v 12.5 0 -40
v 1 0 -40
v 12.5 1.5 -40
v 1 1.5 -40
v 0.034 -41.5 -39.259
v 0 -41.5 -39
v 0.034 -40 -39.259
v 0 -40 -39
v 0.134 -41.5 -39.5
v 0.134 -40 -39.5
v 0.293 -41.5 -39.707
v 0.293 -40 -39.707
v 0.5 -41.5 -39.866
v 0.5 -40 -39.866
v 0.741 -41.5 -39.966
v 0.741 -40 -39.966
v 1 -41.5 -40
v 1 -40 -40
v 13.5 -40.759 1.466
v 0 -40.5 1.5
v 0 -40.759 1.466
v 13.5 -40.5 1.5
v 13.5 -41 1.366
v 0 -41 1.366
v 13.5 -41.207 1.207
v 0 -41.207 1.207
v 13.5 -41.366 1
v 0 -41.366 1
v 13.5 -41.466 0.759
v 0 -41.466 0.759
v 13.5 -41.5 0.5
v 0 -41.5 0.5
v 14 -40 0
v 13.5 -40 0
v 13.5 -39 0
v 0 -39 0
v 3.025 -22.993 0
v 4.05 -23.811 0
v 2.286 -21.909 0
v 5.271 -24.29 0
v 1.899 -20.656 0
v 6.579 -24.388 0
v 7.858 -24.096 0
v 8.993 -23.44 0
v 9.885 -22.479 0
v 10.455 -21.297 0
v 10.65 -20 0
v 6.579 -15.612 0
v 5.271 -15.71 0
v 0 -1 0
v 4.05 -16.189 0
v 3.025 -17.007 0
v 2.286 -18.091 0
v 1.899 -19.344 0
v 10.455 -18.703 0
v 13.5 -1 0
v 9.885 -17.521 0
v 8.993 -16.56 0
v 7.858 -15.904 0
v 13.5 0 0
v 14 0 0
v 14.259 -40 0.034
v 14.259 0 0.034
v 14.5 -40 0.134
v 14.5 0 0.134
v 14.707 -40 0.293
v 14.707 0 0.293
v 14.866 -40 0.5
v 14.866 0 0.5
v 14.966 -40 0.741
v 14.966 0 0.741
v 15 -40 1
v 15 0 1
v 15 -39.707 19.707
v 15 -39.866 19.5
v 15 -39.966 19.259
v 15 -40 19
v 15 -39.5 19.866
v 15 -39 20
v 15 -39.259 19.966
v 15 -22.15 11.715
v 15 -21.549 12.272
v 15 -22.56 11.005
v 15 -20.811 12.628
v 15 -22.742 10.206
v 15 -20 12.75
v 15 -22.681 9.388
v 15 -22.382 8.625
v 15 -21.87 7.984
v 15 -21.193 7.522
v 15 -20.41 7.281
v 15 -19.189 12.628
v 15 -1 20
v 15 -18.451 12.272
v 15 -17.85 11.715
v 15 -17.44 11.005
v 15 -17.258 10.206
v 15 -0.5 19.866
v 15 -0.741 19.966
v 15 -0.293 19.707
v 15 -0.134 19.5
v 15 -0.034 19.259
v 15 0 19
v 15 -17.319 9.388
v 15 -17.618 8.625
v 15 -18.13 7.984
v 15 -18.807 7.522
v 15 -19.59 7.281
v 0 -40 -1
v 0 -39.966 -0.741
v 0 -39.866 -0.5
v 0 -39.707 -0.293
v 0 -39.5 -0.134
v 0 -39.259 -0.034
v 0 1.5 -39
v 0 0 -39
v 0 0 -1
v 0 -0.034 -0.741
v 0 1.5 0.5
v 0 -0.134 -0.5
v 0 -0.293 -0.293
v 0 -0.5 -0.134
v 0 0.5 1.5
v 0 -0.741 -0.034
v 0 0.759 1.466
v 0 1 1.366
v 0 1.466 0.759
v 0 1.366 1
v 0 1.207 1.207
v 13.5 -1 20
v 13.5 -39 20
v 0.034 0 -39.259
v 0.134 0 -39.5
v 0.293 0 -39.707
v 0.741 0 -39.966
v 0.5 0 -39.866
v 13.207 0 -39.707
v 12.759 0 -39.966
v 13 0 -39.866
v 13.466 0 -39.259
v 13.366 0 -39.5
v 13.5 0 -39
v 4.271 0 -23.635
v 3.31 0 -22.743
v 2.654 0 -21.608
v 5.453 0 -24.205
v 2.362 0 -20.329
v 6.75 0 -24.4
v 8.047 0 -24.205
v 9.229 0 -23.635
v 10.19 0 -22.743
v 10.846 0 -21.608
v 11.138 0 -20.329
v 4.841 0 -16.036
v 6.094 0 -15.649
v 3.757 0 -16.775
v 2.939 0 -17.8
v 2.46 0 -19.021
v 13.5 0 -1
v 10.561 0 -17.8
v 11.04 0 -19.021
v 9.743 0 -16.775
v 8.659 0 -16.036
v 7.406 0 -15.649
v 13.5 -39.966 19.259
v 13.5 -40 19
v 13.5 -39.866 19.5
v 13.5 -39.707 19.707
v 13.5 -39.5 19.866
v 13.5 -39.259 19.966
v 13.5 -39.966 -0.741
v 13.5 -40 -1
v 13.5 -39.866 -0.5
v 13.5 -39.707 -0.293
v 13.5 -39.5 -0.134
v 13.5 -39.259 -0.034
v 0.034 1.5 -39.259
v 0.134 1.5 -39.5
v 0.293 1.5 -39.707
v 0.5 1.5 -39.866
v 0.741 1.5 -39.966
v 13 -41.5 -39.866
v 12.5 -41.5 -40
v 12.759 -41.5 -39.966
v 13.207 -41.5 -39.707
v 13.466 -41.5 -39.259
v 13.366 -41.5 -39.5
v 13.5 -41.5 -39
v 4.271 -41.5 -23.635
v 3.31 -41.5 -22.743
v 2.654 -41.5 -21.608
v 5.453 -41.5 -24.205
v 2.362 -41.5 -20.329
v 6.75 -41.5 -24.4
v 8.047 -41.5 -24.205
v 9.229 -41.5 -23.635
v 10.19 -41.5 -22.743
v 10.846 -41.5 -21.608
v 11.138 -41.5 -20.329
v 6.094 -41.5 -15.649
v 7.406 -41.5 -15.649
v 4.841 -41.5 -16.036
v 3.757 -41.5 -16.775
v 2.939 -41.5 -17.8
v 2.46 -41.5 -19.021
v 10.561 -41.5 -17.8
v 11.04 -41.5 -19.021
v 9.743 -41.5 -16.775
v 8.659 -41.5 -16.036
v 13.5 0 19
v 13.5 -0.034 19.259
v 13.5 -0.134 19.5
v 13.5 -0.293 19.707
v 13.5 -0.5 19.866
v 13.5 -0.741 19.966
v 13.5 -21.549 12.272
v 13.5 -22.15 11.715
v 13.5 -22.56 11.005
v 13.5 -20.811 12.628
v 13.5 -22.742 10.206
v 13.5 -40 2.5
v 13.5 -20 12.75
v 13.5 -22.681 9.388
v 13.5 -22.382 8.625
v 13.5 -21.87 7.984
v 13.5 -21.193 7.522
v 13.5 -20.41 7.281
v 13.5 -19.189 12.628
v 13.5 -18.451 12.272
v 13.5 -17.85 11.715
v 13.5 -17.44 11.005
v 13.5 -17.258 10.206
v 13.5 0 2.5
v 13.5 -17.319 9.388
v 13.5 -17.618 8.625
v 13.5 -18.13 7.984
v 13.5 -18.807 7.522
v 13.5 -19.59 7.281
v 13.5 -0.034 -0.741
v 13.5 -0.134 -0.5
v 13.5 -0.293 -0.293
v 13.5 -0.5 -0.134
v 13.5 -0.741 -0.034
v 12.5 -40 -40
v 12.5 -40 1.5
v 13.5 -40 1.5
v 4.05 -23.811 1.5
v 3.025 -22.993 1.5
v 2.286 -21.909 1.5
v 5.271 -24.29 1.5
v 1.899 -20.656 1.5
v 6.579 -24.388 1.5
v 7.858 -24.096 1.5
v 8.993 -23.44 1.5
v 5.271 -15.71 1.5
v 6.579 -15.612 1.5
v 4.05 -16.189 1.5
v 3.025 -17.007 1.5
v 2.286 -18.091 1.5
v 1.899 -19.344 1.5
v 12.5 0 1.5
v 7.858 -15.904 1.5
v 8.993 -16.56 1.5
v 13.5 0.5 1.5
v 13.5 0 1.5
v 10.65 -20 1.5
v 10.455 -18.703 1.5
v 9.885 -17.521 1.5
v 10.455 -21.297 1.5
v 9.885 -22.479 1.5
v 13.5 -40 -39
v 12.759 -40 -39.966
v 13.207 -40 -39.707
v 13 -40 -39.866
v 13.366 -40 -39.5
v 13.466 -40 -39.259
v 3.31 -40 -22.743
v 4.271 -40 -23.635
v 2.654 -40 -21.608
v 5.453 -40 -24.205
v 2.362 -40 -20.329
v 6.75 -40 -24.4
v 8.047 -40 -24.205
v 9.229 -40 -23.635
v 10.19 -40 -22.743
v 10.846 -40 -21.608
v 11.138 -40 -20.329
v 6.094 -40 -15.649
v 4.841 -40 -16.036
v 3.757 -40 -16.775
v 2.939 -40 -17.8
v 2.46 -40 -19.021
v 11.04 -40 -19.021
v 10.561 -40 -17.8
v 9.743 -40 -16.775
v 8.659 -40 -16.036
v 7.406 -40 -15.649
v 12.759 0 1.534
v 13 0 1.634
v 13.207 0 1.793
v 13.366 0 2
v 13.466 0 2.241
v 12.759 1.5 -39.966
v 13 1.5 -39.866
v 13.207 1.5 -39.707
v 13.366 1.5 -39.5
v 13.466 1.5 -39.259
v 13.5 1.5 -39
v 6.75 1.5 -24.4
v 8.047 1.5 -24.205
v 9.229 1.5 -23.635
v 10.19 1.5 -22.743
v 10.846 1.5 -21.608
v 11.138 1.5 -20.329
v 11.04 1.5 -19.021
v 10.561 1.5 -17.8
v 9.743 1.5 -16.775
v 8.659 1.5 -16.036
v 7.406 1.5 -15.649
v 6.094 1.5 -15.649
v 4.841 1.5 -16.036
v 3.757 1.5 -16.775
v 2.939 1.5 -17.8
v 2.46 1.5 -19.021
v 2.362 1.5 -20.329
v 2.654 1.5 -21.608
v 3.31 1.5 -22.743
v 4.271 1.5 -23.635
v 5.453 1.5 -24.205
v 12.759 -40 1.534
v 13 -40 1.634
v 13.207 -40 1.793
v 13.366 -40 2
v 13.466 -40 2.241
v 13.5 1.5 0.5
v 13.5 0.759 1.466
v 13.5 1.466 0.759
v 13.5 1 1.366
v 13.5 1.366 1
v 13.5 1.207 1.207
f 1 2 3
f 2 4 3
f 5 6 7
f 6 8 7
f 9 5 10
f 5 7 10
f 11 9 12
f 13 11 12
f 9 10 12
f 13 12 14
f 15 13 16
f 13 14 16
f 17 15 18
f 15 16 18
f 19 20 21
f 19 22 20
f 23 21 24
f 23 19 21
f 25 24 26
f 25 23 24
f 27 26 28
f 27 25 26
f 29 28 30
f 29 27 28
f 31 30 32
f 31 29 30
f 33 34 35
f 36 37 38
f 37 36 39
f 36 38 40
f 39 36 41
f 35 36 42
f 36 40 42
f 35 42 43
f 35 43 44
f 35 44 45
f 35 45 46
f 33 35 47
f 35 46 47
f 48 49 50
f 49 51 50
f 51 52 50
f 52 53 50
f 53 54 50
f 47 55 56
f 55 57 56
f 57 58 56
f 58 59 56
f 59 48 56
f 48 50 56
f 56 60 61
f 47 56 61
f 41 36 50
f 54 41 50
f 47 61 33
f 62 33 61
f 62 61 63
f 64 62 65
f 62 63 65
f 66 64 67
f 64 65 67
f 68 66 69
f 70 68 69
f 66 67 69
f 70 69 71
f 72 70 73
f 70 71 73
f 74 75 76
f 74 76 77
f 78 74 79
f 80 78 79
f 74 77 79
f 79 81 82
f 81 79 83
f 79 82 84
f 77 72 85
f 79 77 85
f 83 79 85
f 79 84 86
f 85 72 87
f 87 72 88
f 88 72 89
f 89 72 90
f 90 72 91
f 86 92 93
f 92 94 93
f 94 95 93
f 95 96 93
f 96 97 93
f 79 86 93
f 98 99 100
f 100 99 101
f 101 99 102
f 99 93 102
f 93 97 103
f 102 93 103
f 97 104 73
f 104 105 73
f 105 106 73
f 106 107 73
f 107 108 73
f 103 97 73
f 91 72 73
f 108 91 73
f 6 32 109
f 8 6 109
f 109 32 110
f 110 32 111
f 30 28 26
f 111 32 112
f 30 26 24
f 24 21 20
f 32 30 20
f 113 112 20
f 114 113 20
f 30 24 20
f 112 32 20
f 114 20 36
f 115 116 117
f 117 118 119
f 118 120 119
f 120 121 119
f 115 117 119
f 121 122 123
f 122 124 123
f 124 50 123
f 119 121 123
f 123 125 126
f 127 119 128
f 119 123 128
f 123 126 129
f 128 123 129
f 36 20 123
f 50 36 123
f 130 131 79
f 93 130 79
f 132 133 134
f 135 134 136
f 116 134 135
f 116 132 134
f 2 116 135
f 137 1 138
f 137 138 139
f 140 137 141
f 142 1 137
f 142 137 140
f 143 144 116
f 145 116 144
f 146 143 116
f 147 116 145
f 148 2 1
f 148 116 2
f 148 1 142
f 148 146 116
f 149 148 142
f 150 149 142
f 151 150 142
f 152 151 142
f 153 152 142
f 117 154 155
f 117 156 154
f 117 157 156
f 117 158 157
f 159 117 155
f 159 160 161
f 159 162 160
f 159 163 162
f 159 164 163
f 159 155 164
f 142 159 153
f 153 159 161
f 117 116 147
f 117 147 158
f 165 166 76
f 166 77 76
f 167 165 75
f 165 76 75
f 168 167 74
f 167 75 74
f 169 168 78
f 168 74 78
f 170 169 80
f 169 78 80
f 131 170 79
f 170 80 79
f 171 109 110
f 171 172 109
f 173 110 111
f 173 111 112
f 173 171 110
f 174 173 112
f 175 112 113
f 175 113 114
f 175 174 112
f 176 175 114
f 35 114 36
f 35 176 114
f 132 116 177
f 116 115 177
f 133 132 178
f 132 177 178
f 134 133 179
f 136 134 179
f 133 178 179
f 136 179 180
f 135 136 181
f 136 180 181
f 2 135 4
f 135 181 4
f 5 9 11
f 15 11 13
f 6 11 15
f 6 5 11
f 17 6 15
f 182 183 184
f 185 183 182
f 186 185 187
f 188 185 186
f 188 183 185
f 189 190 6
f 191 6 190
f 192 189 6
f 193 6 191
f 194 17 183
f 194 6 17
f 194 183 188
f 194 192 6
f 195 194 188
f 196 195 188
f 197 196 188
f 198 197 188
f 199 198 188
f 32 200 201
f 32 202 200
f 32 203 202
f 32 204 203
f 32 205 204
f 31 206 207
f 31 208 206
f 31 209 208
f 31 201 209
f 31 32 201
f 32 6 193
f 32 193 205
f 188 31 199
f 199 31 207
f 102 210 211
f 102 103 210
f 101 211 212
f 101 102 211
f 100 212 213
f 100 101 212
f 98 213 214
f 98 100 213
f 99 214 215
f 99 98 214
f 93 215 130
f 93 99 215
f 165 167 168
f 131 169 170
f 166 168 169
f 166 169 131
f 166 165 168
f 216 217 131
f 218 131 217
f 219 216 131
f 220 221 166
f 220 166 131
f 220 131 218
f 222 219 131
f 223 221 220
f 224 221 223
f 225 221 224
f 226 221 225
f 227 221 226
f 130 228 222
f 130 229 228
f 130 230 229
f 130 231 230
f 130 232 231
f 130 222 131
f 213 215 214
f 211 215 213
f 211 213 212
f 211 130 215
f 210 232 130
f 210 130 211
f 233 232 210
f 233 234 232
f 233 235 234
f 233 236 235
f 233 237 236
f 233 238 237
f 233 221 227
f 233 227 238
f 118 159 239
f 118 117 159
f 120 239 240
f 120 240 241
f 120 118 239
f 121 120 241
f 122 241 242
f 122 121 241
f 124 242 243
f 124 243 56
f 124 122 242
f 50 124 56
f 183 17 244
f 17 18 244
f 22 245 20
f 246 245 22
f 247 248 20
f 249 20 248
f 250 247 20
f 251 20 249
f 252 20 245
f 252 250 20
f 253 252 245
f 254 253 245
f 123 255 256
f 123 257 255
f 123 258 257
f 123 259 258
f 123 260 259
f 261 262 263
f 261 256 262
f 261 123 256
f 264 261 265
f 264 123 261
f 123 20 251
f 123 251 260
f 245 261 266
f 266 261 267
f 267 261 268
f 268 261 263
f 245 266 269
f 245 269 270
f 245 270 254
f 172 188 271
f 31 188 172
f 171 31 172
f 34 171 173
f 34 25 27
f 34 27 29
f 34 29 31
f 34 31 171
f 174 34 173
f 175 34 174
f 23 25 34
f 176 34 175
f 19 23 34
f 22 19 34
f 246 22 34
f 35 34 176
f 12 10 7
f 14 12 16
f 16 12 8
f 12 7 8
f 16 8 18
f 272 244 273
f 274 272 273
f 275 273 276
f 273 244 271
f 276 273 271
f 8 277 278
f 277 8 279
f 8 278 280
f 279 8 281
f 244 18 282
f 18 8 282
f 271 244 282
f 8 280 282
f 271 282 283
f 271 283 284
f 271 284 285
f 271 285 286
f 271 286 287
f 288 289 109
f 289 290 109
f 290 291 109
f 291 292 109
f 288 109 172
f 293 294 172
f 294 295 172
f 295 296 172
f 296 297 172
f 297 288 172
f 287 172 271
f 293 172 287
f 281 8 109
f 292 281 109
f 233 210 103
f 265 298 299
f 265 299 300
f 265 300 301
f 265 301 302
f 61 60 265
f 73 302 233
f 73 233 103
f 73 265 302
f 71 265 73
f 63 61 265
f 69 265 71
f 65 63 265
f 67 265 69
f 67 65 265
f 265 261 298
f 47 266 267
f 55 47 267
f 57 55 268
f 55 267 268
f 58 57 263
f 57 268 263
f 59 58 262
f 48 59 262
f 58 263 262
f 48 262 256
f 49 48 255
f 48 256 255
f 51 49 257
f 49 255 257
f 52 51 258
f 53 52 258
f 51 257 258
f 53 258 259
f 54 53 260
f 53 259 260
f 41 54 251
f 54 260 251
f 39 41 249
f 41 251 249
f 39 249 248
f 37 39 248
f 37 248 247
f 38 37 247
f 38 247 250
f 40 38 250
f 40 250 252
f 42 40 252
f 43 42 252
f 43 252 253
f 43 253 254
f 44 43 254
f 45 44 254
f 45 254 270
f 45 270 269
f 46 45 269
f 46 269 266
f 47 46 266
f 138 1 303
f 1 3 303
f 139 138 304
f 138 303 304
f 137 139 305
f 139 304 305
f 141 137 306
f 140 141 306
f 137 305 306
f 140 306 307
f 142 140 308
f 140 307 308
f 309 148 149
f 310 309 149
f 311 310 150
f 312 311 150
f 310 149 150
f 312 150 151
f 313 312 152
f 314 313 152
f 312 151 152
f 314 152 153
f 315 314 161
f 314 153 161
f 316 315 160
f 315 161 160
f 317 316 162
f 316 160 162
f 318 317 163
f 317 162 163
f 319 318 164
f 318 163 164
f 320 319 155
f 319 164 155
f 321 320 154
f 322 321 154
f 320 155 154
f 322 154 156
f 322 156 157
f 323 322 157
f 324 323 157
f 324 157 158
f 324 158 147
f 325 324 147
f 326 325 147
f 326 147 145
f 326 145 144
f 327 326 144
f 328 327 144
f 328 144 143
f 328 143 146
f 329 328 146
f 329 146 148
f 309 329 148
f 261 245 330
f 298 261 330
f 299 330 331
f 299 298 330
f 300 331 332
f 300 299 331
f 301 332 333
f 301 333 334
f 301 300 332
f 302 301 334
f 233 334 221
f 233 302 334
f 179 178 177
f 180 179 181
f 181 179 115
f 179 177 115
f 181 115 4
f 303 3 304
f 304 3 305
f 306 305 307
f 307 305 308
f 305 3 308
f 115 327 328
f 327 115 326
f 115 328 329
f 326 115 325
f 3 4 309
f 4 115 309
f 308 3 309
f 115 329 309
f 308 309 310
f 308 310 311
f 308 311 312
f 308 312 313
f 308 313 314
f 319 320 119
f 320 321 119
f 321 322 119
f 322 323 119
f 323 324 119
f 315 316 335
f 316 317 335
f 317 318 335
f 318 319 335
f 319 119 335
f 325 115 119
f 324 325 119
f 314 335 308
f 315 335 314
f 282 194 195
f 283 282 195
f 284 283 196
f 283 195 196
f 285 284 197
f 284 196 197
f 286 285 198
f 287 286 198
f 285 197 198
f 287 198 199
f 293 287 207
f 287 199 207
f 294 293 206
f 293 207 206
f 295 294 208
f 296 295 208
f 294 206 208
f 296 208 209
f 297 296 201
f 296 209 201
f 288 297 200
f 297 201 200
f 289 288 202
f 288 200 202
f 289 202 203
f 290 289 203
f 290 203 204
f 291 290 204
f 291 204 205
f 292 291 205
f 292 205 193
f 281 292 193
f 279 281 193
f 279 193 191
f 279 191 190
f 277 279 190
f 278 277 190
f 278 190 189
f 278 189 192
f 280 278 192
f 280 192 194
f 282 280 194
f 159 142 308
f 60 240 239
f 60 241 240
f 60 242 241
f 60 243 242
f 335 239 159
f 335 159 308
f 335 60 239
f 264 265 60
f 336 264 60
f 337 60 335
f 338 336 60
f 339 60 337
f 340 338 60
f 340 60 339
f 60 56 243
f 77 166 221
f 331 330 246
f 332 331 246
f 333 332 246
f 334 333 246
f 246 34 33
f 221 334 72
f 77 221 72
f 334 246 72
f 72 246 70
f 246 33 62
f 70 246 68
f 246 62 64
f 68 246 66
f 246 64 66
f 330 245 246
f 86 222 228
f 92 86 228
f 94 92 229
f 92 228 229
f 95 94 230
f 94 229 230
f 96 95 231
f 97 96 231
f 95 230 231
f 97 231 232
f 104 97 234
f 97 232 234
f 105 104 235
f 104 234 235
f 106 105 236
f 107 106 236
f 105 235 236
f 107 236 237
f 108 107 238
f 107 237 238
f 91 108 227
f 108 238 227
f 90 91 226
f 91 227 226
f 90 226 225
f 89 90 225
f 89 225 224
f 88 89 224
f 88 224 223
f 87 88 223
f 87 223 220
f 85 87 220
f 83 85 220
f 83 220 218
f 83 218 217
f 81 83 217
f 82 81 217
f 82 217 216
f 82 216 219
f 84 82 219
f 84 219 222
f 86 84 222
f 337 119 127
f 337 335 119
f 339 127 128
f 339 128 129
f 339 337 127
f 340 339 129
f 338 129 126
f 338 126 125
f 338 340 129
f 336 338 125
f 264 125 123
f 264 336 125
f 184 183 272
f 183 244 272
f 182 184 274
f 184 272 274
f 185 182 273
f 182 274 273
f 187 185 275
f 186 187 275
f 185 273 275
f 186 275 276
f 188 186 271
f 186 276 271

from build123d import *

# Parameters (mm, degrees)
SKETCH_1_W          = 13.5
SKETCH_1_H          = 40
EXTRUDE_1_DEPTH     = 1.5
SKETCH_1_3_W        = 1.5
SKETCH_1_3_H        = 40
EXTRUDE_2_DEPTH     = 20
SKETCH_2_W          = 13.5
SKETCH_2_H          = 1.5
EXTRUDE_3_DEPTH     = 41.5
SKETCH_3_R          = 2.75
CUT_EXTRUDE_1_DEPTH = 2
FILLET_1_R          = 1
CUT_EXTRUDE_2_DEPTH = 10
CUT_EXTRUDE_3_DEPTH = 60


with BuildPart() as part:
    # 草图1 → 凸台-拉伸1 (new body)
    with BuildSketch(Plane.XY):
        with Locations((6.75, -20)):
            Rectangle(SKETCH_1_W, SKETCH_1_H)
    extrude(amount=EXTRUDE_1_DEPTH)

    # 草图1<3> → 凸台-拉伸2 (add)
    with BuildSketch(Plane.XY):
        with Locations((14.25, -20)):
            Rectangle(SKETCH_1_3_W, SKETCH_1_3_H)
    extrude(amount=EXTRUDE_2_DEPTH)

    # 草图2 → 凸台-拉伸3 (add)
    with BuildSketch(Plane.XY.offset(1.5)):
        with Locations((6.75, 0.75)):
            Rectangle(SKETCH_2_W, SKETCH_2_H)
        with Locations((6.75, -40.75)):
            Rectangle(SKETCH_2_W, SKETCH_2_H)
    extrude(amount=-EXTRUDE_3_DEPTH)

    # 草图3 → 切除-拉伸1 (cut)
    with BuildSketch(Plane.ZY.offset(-13.5)):
        with Locations((10, -20)):
            Circle(SKETCH_3_R)
    extrude(amount=-CUT_EXTRUDE_1_DEPTH, mode=Mode.SUBTRACT)

    # 圆角1
    fillet_1_edges = [part.edges().sort_by_distance(p)[0] for p in [
        (14.25, 0, 20),
        (14.25, -40, 20),
        (13.5, -20, 1.5),
        (6.75, 0, 0),
        (6.75, 1.5, 1.5),
        (6.75, -40, 0),
        (15, -20, 0),
        (6.75, -41.5, 1.5),
        (13.5, 0.75, -40),
        (13.5, -40.75, -40),
        (0, -40.75, -40),
        (0, 0.75, -40),
    ]]
    fillet(fillet_1_edges, radius=FILLET_1_R)

    # 草图10 → 切除-拉伸2 (cut)
    with BuildSketch(Plane.XY.offset(1.5)):
        with BuildLine():
            ThreePointArc((1.85, -20), (6.25, -24.4), (10.65, -20))
            ThreePointArc((10.65, -20), (6.25, -15.6), (1.85, -20))
        make_face()
    extrude(amount=-CUT_EXTRUDE_2_DEPTH, mode=Mode.SUBTRACT)

    # 草图5 → 切除-拉伸3 (cut)
    with BuildSketch(Plane.XZ.offset(41.5)):
        with BuildLine():
            ThreePointArc((6.75, -24.4), (9.861269837, -23.111269837), (11.15, -20))
            ThreePointArc((11.15, -20), (3.638730163, -16.888730163), (6.75, -24.4))
        make_face()
    extrude(amount=-CUT_EXTRUDE_3_DEPTH, mode=Mode.SUBTRACT)


solid = part.part
